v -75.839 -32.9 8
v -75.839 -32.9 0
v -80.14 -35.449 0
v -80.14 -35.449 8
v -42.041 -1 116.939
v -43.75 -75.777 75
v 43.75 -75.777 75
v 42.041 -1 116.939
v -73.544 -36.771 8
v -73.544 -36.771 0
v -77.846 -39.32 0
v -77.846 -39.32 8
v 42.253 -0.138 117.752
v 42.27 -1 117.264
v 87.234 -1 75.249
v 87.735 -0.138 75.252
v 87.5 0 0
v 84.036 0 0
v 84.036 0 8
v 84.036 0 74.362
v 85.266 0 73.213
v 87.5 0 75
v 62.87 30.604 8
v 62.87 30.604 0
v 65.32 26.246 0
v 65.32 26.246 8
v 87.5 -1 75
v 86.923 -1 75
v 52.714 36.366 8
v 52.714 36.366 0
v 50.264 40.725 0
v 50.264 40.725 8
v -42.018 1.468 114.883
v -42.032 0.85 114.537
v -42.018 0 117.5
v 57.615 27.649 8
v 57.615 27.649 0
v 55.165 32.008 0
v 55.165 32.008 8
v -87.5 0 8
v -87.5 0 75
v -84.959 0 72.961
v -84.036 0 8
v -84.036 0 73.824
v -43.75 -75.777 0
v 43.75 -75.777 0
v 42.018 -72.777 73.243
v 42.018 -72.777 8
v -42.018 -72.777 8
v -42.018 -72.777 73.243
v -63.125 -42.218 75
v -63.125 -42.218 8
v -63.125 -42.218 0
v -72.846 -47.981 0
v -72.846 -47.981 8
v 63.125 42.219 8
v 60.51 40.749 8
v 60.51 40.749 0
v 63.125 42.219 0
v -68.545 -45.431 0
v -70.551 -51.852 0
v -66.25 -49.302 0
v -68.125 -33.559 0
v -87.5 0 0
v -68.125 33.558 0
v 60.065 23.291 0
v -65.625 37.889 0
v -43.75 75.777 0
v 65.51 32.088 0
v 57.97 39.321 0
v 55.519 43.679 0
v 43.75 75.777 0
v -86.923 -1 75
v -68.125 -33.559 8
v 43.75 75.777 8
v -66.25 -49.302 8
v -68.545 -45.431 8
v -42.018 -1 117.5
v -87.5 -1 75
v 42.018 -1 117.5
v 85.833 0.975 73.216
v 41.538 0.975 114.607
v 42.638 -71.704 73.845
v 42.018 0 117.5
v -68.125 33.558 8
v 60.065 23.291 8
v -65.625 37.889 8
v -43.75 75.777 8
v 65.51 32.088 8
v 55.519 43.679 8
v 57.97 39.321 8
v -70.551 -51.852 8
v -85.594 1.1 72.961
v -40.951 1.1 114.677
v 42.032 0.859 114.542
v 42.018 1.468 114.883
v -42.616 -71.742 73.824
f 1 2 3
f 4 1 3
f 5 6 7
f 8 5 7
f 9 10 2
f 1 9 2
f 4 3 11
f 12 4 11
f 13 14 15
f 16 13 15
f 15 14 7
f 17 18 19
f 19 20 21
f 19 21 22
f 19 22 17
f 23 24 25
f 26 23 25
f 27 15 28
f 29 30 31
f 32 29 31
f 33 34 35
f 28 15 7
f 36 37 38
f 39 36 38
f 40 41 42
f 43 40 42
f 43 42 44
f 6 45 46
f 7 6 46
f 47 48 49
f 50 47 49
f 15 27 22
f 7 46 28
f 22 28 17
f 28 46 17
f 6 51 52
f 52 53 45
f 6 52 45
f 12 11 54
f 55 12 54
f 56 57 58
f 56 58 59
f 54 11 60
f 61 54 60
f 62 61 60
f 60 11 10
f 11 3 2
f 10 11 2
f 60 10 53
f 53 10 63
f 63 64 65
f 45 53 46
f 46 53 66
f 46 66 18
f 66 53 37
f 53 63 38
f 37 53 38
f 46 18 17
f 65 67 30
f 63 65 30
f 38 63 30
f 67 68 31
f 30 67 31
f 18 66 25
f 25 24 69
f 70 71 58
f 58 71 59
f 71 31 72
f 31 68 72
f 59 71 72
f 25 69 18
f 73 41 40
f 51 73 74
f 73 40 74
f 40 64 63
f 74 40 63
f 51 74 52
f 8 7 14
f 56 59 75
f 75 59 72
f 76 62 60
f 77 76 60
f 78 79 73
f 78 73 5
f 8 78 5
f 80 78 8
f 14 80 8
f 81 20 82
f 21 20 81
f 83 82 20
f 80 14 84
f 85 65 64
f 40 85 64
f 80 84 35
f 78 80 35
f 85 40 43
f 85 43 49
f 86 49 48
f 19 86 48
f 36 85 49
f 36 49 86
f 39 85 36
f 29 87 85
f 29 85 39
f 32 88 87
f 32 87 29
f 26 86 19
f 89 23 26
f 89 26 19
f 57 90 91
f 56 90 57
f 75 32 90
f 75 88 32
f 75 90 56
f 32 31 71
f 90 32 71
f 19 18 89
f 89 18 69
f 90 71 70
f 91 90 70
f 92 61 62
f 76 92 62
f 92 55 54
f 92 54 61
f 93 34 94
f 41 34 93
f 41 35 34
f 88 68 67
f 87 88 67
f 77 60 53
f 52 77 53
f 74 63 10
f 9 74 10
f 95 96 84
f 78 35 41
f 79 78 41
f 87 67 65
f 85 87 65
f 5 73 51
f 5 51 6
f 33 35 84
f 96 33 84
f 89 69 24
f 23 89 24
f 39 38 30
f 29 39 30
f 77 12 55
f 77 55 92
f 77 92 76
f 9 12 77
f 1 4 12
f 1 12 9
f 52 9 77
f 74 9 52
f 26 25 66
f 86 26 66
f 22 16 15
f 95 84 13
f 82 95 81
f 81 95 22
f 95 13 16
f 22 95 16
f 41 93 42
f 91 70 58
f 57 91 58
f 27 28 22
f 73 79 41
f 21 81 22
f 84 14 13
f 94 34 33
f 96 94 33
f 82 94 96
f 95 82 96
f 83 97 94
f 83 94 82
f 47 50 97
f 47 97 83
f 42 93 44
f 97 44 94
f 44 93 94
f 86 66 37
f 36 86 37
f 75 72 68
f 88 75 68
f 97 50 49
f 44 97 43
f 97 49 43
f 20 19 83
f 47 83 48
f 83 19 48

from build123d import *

# Parameters (mm, degrees)
F0_W      = 50
F0_H      = 12.5
F1_DEPTH  = 8
F2_DEPTH  = 75
F4_DEPTH  = 8
F7_DEPTH  = 3
F8_DEPTH  = 1
F11_DEPTH = 3
F14_DEPTH = 3
F15_DEPTH = 8
F16_DEPTH = 8


# Not quite as in the source:
# - a feature names something its author has since deleted; it is built from what else it names


with BuildPart() as f1:
    # F0 (on Top) → F1 (new body)
    with BuildSketch(Plane.XY):
        Polygon((57.9695070384, 39.3207329262), (60.5095952989, 40.7487522591), (42.0179491924, 72.7772228311), (-42.0179491924, 72.7772228311), (-84.0358983849, 0), (-42.0179491924, -72.7772228311), (42.0179491924, -72.7772228311), (84.0358983849, 0), (65.5097997054, 32.0881441788), (62.870004896, 30.6039762231), (65.3204122546, 26.2455930623), (60.0654171506, 23.2910848888), (57.615009792, 27.6494680496), (55.164720758, 32.0079177338), (52.7144317239, 36.366367418), (50.2642610162, 40.7248836223), (55.5194165334, 43.6791064608), align=None)
        with Locations((0, 54.5829171234)):
            Rectangle(F0_W, F0_H, mode=Mode.SUBTRACT)
    extrude(amount=F1_DEPTH)

    # F0 (on Top) → F2 (join)
    with BuildSketch(Plane.XY):
        Polygon((-84.0358983849, 0), (-87.5, 0), (-68.1246734519, -33.5590499945), (-63.1251610364, -42.2184595112), (-43.75, -75.7772228311), (43.75, -75.7772228311), (87.5, 0), (84.0358983849, 0), (42.0179491924, -72.7772228311), (-42.0179491924, -72.7772228311), align=None)
    extrude(amount=F2_DEPTH)

    # F0 (on Top) → F4 (join)
    with BuildSketch(Plane.XY):
        Polygon((43.75, 75.7772228311), (-43.75, 75.7772228311), (-65.625, 37.8886114156), (-68.125, 33.5584843966), (-87.5, 0), (-84.0358983849, 0), (-42.0179491924, 72.7772228311), (42.0179491924, 72.7772228311), (60.5095952989, 40.7487522591), (63.1248363216, 42.2190219338), align=None)
    extrude(amount=F4_DEPTH)

    # F6 (on face) → F7 (join)
    with BuildSketch(Plane(origin=(0, -50.1312366318, 89.3836679776), x_dir=(1, 0, 0), z_dir=(0, 0.4891706574, -0.872188092))):
        Polygon((43.75, 29.4041920927), (0, 29.4041920927), (-43.75, 29.4041920927), (-42.01795, -57.4775522498), (42.01795, -57.4775522498), align=None)
    extrude(amount=F7_DEPTH)

    # F3 (on Front) → F8 (join)
    with BuildSketch(Plane.XZ):
        Polygon((-42.01795, 114.5), (0, 114.5), (42.01795, 114.5), (84.0359, 75), (87.5, 75), (42.01795, 117.5), (0, 117.5), (-42.01795, 117.5), (-87.5, 75), (-84.0359, 75), align=None)
    extrude(amount=F8_DEPTH)

    # F10 (on face) → F11 (join)
    with BuildSketch(Plane(origin=(-67.6846727043, -39.0777640058, 72.4338274863), x_dir=(0.7723629594, -0.3015876344, 0.5590173143), z_dir=(-0.6351814378, -0.3667221741, 0.6797495039))):
        Polygon((33.2314262259, 55.789645187), (-25.6554603702, 35.6104118215), (30.9888924807, -31.0804218073), align=None)
    extrude(amount=-F11_DEPTH)

    # F13 (on face) → F14 (join)
    with BuildSketch(Plane(origin=(67.6756688636, -39.5950852503, 72.4241918832), x_dir=(0.7733047167, 0.3041472681, -0.556322078), z_dir=(-0.6340345536, 0.3709553614, -0.6785221475))):
        Polygon((-30.939509805, 30.5117392321), (-32.8751652468, -56.3649154418), (25.9400068576, -35.9776056011), align=None)
    extrude(amount=F14_DEPTH)

    # F0 (on Top) → F15 (join)
    with BuildSketch(Plane.XY):
        with Locations((0, 54.5829171234)):
            Rectangle(F0_W, F0_H)
    extrude(amount=F15_DEPTH)

    # F0 (on Top) → F16 (join)
    with BuildSketch(Plane.XY):
        Polygon((-77.8456264388, -39.3203929827), (-73.5443198074, -36.7711261738), (-75.8386599429, -32.8999502926), (-80.1399666105, -35.4492170403), align=None)
        Polygon((-63.1251610364, -42.2184595112), (-68.1246734519, -33.5590499945), (-73.5443198074, -36.7711261738), (-77.8456264388, -39.3203929827), (-72.8456167613, -47.9806414332), (-68.5445301574, -45.4310034146), align=None)
        Polygon((-66.2498559406, -49.3019813581), (-68.5445301574, -45.4310034146), (-72.8456167613, -47.9806414332), (-70.5509425445, -51.8516193767), align=None)
    extrude(amount=F16_DEPTH)


solid = f1.part
